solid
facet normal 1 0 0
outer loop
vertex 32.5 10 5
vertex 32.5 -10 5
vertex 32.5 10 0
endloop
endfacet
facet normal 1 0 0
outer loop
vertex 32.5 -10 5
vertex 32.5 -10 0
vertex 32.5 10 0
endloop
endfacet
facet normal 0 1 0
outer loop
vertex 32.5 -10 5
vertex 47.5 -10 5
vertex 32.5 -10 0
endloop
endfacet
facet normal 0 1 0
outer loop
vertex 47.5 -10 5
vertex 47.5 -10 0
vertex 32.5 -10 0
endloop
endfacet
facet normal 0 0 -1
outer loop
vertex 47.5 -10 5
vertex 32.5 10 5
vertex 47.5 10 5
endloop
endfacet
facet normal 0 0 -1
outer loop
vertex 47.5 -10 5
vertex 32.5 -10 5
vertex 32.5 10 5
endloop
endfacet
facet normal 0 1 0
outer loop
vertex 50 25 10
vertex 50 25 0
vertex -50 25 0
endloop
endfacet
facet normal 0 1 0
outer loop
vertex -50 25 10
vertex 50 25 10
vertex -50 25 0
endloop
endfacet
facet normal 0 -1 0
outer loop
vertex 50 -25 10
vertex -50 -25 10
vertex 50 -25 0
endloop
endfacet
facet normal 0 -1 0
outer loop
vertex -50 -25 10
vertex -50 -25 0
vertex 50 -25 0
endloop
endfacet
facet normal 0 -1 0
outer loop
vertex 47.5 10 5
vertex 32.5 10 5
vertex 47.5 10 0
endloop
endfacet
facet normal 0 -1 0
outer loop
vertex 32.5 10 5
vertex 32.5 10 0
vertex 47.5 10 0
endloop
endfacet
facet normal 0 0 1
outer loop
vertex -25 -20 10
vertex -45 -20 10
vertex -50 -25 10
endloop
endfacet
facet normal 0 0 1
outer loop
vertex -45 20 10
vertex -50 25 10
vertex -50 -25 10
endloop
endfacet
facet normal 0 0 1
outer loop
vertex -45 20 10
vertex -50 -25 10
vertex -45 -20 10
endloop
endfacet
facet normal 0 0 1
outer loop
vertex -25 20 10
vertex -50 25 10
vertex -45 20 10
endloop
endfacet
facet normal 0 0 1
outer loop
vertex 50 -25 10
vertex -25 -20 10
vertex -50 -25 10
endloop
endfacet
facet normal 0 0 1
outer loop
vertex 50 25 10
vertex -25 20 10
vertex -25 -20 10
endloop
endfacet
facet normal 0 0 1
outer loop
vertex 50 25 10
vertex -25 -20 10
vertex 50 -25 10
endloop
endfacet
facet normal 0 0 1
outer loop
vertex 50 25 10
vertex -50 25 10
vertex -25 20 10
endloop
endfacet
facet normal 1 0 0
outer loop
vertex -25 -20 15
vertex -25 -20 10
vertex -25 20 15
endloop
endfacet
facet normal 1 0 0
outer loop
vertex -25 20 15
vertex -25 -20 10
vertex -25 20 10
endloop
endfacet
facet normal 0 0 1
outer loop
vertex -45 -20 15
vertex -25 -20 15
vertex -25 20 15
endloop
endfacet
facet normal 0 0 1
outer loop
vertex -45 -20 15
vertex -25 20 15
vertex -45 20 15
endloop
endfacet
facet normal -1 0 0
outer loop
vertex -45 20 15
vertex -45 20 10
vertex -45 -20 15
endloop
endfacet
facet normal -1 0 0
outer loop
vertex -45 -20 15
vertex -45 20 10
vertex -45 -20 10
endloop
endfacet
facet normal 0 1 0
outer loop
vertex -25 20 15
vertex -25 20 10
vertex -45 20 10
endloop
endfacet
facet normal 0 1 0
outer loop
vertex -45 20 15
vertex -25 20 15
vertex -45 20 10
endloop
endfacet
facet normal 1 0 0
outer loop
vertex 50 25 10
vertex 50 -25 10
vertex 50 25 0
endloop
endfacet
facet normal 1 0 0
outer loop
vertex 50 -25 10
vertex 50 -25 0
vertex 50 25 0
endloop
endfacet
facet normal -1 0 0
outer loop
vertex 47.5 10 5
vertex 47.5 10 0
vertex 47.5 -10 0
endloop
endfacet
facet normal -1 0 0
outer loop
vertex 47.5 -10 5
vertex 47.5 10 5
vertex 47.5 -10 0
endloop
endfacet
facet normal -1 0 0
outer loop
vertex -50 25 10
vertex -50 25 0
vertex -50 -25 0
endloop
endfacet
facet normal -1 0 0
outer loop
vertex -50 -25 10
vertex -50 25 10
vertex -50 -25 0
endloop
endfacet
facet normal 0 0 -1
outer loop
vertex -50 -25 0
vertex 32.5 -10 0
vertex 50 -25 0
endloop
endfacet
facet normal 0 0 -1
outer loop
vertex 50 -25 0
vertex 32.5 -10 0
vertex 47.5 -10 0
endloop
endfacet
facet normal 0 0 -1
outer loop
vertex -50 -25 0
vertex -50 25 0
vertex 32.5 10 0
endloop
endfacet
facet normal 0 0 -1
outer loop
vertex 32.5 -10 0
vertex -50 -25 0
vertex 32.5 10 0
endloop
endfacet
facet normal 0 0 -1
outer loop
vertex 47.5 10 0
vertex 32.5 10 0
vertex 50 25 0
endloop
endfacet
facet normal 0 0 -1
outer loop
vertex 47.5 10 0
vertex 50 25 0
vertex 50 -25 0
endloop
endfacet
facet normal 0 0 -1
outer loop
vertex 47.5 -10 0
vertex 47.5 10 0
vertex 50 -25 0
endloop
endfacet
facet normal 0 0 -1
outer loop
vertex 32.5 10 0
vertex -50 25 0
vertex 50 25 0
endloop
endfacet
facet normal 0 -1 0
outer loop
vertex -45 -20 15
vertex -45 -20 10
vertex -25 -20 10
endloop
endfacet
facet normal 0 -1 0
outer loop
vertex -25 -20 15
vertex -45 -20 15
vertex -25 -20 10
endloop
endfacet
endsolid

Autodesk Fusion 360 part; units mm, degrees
sketch "machine arm" plane through (0, 0, 0) normal (0, 0, 1) x (1, 0, 0)
  line L0 (-50, -25) -> (50, -25)
  line L1 (50, -25) -> (50, 25)
  line L2 (50, 25) -> (-50, 25)
  line L3 (-50, 25) -> (-50, -25)
  line L4 (-50, -25) -> (50, 25) construction
  line L5 (50, -25) -> (-50, 25) construction
  dimension "d1" = 100
  dimension "d2" = 50
extrude "Extrude1" add sketch "machine arm" along normal blind 10
sketch "socket" plane through (0, 0, 0) normal (0, 0, -1) x (1, 0, 0)
  line L0 (-50, 25) -> (-50, -25)
  line L1 (-50, -25) -> (50, -25)
  line L2 (50, -25) -> (50, 25)
  line L3 (50, 25) -> (-50, 25)
  line L4 (47.5, 10) -> (32.5, 10)
  line L5 (32.5, 10) -> (32.5, -10)
  line L6 (32.5, -10) -> (47.5, -10)
  line L7 (47.5, -10) -> (47.5, 10)
  line L8 (47.5, 10) -> (32.5, -10) construction
  line L9 (32.5, 10) -> (47.5, -10) construction
  point P0 (40, 0)
  dimension "d5" = 15
  dimension "d6" = 20
extrude "Extrude2" cut sketch "socket" against normal blind 5 contours L4 L5 L6 L7
sketch "Sketch3" plane through (0, 0, 10) normal (0, 0, 1) x (-1, 0, 0)
  line L0 (50, -25) -> (50, 25)
  line L1 (50, 25) -> (-50, 25)
  line L2 (-50, 25) -> (-50, -25)
  line L3 (-50, -25) -> (50, -25)
  line L4 (25, -20) -> (45, -20)
  line L5 (45, -20) -> (45, 20)
  line L6 (45, 20) -> (25, 20)
  line L7 (25, 20) -> (25, -20)
  point P0 (25, -20)
extrude "Extrude3" add sketch "Sketch3" along normal blind 5 contours L4 L5 L6 L7
